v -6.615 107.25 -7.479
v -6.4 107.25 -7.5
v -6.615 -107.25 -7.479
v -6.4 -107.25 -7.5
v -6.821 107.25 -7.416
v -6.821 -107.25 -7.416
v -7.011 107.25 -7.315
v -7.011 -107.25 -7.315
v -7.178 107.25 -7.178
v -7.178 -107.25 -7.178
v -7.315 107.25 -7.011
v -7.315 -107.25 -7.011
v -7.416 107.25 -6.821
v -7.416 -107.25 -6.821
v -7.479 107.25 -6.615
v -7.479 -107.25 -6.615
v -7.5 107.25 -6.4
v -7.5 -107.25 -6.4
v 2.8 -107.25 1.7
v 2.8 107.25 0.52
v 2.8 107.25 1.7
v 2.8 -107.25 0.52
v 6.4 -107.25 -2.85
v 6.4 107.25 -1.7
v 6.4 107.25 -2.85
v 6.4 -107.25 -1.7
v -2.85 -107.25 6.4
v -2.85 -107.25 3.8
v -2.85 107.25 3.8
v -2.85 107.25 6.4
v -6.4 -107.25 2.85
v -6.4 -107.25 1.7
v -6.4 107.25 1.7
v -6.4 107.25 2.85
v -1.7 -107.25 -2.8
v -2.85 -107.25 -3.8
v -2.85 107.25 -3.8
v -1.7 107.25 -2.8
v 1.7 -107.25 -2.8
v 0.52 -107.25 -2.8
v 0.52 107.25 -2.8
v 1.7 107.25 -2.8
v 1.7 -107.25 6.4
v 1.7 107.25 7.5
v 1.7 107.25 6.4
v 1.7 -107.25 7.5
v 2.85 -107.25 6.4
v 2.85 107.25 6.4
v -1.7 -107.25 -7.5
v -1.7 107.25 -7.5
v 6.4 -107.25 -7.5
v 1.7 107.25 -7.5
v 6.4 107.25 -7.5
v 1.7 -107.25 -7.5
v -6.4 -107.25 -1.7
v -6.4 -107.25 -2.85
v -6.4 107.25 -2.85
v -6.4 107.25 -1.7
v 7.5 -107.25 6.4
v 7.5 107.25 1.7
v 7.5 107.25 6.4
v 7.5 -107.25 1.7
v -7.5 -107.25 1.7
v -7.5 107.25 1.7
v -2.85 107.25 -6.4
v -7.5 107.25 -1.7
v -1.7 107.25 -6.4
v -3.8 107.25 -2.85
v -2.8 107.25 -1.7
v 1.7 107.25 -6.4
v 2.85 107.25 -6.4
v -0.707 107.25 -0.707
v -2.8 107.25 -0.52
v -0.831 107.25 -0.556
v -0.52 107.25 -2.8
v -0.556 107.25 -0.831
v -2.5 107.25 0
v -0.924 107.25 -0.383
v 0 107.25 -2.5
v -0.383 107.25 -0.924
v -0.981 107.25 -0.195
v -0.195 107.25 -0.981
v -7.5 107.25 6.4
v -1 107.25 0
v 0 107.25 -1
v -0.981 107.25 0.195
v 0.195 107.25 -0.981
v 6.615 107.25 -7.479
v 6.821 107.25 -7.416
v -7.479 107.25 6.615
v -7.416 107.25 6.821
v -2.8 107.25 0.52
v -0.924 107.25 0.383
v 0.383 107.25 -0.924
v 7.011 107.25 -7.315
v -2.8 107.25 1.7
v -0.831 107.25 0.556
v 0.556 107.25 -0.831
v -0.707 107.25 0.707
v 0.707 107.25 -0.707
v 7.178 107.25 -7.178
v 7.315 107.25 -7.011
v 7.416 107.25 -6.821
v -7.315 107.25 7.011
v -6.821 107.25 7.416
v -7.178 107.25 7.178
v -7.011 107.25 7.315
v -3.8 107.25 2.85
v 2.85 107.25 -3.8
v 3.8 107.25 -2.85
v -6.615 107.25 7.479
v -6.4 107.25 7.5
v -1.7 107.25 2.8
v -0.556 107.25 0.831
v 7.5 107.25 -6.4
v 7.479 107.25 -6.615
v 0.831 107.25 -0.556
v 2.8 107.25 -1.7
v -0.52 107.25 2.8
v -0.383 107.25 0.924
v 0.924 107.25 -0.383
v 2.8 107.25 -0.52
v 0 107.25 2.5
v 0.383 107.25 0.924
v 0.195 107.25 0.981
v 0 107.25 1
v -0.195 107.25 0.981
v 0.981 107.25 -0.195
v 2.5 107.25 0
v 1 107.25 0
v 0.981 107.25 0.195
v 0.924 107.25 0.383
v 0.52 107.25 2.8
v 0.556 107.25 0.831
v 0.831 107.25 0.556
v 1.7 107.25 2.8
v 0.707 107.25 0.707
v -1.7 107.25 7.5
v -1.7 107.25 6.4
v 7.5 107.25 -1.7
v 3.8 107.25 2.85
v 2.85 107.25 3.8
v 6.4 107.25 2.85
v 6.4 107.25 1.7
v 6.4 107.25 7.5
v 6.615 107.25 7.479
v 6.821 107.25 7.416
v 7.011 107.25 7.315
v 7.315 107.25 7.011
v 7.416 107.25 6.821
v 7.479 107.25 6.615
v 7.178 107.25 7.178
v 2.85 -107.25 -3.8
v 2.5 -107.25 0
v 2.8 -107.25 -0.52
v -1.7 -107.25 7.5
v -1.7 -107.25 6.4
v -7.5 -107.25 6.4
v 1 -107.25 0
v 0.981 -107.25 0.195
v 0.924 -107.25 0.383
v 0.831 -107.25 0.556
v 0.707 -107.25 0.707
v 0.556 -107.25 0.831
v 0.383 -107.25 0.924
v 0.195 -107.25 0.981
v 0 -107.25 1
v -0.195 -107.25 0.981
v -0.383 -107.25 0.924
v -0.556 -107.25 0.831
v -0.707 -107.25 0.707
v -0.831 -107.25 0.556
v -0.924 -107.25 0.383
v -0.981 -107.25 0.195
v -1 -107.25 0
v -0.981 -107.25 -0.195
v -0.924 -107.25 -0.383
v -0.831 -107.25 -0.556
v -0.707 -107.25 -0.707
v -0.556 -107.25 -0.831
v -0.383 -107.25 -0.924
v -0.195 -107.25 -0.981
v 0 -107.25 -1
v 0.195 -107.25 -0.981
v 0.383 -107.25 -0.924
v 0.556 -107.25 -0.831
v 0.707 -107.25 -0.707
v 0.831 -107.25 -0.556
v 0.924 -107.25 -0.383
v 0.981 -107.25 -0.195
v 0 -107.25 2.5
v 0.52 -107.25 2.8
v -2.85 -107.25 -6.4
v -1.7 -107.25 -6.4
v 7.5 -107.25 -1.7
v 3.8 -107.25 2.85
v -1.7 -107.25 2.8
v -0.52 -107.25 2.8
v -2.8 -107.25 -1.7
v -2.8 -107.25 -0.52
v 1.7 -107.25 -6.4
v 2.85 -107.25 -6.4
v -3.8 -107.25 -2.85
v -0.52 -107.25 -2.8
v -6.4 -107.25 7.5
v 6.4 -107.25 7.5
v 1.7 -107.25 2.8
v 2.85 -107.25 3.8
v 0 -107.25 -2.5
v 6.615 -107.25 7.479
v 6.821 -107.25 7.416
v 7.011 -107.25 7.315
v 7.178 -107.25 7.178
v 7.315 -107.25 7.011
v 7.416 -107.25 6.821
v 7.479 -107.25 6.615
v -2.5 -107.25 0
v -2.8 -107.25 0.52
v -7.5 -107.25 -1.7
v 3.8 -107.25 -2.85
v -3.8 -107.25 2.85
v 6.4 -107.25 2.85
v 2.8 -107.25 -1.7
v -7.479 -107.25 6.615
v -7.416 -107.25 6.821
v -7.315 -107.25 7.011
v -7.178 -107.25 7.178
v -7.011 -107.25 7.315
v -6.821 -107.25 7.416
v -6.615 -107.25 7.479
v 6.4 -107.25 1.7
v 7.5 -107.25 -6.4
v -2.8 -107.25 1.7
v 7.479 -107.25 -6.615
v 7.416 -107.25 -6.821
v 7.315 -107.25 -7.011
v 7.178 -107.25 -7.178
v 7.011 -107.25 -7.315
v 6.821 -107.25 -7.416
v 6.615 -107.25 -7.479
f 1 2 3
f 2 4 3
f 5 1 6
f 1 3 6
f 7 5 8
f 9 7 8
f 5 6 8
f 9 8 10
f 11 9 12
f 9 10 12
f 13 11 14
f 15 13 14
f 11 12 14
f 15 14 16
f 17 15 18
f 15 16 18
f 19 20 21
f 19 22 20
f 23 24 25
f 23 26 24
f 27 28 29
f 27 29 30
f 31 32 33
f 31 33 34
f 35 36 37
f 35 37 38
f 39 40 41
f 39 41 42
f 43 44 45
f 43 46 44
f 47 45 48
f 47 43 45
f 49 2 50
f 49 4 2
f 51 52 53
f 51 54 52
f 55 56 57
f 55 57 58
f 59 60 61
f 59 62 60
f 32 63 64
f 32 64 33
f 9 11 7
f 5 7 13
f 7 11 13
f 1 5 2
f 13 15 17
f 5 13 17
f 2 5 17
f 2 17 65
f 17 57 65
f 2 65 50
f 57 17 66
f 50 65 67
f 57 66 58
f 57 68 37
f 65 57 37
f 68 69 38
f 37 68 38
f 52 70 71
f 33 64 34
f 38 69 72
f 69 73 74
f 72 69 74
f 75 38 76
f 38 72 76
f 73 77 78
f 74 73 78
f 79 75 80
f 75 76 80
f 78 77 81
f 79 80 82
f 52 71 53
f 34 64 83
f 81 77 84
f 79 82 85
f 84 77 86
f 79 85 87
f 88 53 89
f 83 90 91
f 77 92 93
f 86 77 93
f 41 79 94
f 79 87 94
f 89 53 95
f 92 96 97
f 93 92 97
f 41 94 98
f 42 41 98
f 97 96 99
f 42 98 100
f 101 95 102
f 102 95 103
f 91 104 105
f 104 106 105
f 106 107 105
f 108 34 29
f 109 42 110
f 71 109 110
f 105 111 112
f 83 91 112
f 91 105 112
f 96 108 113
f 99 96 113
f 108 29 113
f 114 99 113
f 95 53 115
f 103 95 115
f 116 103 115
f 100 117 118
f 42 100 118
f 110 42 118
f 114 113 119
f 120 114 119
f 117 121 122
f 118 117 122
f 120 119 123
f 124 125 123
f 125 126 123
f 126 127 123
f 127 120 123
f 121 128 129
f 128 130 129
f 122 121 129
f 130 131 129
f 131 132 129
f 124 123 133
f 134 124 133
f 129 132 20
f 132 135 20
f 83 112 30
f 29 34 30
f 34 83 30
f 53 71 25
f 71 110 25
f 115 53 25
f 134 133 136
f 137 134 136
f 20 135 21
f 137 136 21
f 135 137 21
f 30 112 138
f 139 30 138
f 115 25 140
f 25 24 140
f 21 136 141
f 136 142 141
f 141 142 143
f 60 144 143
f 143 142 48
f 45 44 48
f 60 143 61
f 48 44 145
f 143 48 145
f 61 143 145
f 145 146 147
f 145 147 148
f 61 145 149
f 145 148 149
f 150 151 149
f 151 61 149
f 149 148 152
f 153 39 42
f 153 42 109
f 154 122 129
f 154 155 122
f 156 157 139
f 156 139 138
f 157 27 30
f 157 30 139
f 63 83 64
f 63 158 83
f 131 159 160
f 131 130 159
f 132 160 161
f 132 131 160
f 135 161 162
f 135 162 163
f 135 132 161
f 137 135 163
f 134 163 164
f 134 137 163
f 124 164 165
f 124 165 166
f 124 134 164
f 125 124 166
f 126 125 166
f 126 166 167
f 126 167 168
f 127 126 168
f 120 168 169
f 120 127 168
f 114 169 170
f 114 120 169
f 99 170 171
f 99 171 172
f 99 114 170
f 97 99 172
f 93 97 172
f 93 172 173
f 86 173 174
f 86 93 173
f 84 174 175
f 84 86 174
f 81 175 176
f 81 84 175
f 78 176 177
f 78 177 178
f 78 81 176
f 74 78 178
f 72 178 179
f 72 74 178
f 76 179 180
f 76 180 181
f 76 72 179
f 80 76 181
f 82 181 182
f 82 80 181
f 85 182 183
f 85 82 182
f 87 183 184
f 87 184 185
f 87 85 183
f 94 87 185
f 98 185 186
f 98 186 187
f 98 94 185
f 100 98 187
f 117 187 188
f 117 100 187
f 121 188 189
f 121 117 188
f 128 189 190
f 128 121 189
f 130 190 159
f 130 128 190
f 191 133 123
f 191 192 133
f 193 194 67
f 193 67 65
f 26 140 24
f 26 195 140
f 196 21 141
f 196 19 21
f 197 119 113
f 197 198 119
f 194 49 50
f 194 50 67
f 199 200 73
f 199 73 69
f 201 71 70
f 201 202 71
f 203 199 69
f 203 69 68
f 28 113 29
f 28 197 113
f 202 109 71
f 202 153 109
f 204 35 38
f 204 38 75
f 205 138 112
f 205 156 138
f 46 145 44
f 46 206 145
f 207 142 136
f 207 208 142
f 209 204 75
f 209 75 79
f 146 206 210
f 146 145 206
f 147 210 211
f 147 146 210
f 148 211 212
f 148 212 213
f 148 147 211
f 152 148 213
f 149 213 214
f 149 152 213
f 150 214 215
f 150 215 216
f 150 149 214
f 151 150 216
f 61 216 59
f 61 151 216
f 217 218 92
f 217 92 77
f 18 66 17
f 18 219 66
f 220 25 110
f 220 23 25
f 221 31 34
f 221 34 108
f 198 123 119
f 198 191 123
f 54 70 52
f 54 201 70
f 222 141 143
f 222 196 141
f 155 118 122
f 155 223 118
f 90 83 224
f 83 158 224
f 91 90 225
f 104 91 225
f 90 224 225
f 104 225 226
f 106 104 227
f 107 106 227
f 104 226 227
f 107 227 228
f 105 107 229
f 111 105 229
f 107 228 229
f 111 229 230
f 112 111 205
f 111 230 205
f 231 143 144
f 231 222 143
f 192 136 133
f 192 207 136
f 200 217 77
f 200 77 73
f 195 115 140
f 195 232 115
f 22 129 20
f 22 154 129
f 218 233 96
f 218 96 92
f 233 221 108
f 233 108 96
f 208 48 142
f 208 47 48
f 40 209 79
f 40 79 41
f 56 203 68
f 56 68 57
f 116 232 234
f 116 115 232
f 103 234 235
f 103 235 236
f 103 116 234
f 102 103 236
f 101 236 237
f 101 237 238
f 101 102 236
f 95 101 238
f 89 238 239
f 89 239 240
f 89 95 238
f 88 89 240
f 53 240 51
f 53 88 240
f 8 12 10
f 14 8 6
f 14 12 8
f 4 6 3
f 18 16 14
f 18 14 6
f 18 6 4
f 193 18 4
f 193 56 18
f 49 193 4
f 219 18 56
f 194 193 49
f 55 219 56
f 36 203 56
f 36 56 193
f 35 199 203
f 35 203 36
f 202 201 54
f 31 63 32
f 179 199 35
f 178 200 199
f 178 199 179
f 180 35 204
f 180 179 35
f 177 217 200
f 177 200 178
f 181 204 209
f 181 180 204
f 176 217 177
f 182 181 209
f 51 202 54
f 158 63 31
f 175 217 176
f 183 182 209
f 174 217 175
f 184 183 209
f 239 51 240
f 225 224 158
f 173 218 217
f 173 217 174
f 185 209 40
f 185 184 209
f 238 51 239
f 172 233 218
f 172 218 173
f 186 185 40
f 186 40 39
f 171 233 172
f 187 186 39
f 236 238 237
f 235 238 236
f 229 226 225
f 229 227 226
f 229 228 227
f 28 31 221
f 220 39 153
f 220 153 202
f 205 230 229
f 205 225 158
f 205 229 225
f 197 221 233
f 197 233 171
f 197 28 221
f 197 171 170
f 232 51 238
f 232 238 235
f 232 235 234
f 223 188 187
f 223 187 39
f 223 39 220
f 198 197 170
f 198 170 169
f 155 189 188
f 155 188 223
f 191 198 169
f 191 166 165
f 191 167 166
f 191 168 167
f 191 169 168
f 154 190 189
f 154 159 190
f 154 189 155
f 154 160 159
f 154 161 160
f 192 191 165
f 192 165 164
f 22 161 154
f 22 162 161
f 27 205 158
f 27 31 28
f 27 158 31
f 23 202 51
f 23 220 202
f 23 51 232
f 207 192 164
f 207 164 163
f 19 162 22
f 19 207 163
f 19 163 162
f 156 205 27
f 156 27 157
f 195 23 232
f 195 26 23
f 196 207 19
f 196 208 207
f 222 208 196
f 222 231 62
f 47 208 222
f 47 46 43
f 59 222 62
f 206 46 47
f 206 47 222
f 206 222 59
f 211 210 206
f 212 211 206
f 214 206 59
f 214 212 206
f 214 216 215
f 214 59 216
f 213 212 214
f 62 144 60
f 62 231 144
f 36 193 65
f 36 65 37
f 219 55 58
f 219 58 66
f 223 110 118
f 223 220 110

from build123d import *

# Parameters (mm, degrees)
F0_R     = 1
F1_DEPTH = 107.25
F2_R     = 1.1


with BuildPart() as f1:
    # F0 (on Front) → F1 (new body, symmetric)
    with BuildSketch(Plane.XZ):
        Polygon((-1.7, 2.8), (-2.85, 3.8), (-2.85, 6.4), (-1.7, 6.4), (-1.7, 7.5), (-7.5, 7.5), (-7.5, 1.7), (-6.4, 1.7), (-6.4, 2.85), (-3.8, 2.85), (-2.8, 1.7), (-2.8, 0.5196152423), (-2.5, 0), (-2.8, -0.5196152423), (-2.8, -1.7), (-3.8, -2.85), (-6.4, -2.85), (-6.4, -1.7), (-7.5, -1.7), (-7.5, -7.5), (-1.7, -7.5), (-1.7, -6.4), (-2.85, -6.4), (-2.85, -3.8), (-1.7, -2.8), (-0.5196152423, -2.8), (0, -2.5), (0.5196152423, -2.8), (1.7, -2.8), (2.85, -3.8), (2.85, -6.4), (1.7, -6.4), (1.7, -7.5), (7.5, -7.5), (7.5, -1.7), (6.4, -1.7), (6.4, -2.85), (3.8, -2.85), (2.8, -1.7), (2.8, -0.5196152423), (2.5, 0), (2.8, 0.5196152423), (2.8, 1.7), (3.8, 2.85), (6.4, 2.85), (6.4, 1.7), (7.5, 1.7), (7.5, 7.5), (1.7, 7.5), (1.7, 6.4), (2.85, 6.4), (2.85, 3.8), (1.7, 2.8), (0.5196152423, 2.8), (0, 2.5), (-0.5196152423, 2.8), align=None)
        Circle(F0_R, mode=Mode.SUBTRACT)
    extrude(amount=F1_DEPTH, both=True)

    # F2
    f2_edges = [f1.edges().sort_by_distance(p)[0] for p in [
        (7.5, 0, 7.5),
        (-7.5, 0, 7.5),
        (7.5, 0, -7.5),
        (-7.5, 0, -7.5),
    ]]
    fillet(f2_edges, radius=F2_R)


solid = f1.part
